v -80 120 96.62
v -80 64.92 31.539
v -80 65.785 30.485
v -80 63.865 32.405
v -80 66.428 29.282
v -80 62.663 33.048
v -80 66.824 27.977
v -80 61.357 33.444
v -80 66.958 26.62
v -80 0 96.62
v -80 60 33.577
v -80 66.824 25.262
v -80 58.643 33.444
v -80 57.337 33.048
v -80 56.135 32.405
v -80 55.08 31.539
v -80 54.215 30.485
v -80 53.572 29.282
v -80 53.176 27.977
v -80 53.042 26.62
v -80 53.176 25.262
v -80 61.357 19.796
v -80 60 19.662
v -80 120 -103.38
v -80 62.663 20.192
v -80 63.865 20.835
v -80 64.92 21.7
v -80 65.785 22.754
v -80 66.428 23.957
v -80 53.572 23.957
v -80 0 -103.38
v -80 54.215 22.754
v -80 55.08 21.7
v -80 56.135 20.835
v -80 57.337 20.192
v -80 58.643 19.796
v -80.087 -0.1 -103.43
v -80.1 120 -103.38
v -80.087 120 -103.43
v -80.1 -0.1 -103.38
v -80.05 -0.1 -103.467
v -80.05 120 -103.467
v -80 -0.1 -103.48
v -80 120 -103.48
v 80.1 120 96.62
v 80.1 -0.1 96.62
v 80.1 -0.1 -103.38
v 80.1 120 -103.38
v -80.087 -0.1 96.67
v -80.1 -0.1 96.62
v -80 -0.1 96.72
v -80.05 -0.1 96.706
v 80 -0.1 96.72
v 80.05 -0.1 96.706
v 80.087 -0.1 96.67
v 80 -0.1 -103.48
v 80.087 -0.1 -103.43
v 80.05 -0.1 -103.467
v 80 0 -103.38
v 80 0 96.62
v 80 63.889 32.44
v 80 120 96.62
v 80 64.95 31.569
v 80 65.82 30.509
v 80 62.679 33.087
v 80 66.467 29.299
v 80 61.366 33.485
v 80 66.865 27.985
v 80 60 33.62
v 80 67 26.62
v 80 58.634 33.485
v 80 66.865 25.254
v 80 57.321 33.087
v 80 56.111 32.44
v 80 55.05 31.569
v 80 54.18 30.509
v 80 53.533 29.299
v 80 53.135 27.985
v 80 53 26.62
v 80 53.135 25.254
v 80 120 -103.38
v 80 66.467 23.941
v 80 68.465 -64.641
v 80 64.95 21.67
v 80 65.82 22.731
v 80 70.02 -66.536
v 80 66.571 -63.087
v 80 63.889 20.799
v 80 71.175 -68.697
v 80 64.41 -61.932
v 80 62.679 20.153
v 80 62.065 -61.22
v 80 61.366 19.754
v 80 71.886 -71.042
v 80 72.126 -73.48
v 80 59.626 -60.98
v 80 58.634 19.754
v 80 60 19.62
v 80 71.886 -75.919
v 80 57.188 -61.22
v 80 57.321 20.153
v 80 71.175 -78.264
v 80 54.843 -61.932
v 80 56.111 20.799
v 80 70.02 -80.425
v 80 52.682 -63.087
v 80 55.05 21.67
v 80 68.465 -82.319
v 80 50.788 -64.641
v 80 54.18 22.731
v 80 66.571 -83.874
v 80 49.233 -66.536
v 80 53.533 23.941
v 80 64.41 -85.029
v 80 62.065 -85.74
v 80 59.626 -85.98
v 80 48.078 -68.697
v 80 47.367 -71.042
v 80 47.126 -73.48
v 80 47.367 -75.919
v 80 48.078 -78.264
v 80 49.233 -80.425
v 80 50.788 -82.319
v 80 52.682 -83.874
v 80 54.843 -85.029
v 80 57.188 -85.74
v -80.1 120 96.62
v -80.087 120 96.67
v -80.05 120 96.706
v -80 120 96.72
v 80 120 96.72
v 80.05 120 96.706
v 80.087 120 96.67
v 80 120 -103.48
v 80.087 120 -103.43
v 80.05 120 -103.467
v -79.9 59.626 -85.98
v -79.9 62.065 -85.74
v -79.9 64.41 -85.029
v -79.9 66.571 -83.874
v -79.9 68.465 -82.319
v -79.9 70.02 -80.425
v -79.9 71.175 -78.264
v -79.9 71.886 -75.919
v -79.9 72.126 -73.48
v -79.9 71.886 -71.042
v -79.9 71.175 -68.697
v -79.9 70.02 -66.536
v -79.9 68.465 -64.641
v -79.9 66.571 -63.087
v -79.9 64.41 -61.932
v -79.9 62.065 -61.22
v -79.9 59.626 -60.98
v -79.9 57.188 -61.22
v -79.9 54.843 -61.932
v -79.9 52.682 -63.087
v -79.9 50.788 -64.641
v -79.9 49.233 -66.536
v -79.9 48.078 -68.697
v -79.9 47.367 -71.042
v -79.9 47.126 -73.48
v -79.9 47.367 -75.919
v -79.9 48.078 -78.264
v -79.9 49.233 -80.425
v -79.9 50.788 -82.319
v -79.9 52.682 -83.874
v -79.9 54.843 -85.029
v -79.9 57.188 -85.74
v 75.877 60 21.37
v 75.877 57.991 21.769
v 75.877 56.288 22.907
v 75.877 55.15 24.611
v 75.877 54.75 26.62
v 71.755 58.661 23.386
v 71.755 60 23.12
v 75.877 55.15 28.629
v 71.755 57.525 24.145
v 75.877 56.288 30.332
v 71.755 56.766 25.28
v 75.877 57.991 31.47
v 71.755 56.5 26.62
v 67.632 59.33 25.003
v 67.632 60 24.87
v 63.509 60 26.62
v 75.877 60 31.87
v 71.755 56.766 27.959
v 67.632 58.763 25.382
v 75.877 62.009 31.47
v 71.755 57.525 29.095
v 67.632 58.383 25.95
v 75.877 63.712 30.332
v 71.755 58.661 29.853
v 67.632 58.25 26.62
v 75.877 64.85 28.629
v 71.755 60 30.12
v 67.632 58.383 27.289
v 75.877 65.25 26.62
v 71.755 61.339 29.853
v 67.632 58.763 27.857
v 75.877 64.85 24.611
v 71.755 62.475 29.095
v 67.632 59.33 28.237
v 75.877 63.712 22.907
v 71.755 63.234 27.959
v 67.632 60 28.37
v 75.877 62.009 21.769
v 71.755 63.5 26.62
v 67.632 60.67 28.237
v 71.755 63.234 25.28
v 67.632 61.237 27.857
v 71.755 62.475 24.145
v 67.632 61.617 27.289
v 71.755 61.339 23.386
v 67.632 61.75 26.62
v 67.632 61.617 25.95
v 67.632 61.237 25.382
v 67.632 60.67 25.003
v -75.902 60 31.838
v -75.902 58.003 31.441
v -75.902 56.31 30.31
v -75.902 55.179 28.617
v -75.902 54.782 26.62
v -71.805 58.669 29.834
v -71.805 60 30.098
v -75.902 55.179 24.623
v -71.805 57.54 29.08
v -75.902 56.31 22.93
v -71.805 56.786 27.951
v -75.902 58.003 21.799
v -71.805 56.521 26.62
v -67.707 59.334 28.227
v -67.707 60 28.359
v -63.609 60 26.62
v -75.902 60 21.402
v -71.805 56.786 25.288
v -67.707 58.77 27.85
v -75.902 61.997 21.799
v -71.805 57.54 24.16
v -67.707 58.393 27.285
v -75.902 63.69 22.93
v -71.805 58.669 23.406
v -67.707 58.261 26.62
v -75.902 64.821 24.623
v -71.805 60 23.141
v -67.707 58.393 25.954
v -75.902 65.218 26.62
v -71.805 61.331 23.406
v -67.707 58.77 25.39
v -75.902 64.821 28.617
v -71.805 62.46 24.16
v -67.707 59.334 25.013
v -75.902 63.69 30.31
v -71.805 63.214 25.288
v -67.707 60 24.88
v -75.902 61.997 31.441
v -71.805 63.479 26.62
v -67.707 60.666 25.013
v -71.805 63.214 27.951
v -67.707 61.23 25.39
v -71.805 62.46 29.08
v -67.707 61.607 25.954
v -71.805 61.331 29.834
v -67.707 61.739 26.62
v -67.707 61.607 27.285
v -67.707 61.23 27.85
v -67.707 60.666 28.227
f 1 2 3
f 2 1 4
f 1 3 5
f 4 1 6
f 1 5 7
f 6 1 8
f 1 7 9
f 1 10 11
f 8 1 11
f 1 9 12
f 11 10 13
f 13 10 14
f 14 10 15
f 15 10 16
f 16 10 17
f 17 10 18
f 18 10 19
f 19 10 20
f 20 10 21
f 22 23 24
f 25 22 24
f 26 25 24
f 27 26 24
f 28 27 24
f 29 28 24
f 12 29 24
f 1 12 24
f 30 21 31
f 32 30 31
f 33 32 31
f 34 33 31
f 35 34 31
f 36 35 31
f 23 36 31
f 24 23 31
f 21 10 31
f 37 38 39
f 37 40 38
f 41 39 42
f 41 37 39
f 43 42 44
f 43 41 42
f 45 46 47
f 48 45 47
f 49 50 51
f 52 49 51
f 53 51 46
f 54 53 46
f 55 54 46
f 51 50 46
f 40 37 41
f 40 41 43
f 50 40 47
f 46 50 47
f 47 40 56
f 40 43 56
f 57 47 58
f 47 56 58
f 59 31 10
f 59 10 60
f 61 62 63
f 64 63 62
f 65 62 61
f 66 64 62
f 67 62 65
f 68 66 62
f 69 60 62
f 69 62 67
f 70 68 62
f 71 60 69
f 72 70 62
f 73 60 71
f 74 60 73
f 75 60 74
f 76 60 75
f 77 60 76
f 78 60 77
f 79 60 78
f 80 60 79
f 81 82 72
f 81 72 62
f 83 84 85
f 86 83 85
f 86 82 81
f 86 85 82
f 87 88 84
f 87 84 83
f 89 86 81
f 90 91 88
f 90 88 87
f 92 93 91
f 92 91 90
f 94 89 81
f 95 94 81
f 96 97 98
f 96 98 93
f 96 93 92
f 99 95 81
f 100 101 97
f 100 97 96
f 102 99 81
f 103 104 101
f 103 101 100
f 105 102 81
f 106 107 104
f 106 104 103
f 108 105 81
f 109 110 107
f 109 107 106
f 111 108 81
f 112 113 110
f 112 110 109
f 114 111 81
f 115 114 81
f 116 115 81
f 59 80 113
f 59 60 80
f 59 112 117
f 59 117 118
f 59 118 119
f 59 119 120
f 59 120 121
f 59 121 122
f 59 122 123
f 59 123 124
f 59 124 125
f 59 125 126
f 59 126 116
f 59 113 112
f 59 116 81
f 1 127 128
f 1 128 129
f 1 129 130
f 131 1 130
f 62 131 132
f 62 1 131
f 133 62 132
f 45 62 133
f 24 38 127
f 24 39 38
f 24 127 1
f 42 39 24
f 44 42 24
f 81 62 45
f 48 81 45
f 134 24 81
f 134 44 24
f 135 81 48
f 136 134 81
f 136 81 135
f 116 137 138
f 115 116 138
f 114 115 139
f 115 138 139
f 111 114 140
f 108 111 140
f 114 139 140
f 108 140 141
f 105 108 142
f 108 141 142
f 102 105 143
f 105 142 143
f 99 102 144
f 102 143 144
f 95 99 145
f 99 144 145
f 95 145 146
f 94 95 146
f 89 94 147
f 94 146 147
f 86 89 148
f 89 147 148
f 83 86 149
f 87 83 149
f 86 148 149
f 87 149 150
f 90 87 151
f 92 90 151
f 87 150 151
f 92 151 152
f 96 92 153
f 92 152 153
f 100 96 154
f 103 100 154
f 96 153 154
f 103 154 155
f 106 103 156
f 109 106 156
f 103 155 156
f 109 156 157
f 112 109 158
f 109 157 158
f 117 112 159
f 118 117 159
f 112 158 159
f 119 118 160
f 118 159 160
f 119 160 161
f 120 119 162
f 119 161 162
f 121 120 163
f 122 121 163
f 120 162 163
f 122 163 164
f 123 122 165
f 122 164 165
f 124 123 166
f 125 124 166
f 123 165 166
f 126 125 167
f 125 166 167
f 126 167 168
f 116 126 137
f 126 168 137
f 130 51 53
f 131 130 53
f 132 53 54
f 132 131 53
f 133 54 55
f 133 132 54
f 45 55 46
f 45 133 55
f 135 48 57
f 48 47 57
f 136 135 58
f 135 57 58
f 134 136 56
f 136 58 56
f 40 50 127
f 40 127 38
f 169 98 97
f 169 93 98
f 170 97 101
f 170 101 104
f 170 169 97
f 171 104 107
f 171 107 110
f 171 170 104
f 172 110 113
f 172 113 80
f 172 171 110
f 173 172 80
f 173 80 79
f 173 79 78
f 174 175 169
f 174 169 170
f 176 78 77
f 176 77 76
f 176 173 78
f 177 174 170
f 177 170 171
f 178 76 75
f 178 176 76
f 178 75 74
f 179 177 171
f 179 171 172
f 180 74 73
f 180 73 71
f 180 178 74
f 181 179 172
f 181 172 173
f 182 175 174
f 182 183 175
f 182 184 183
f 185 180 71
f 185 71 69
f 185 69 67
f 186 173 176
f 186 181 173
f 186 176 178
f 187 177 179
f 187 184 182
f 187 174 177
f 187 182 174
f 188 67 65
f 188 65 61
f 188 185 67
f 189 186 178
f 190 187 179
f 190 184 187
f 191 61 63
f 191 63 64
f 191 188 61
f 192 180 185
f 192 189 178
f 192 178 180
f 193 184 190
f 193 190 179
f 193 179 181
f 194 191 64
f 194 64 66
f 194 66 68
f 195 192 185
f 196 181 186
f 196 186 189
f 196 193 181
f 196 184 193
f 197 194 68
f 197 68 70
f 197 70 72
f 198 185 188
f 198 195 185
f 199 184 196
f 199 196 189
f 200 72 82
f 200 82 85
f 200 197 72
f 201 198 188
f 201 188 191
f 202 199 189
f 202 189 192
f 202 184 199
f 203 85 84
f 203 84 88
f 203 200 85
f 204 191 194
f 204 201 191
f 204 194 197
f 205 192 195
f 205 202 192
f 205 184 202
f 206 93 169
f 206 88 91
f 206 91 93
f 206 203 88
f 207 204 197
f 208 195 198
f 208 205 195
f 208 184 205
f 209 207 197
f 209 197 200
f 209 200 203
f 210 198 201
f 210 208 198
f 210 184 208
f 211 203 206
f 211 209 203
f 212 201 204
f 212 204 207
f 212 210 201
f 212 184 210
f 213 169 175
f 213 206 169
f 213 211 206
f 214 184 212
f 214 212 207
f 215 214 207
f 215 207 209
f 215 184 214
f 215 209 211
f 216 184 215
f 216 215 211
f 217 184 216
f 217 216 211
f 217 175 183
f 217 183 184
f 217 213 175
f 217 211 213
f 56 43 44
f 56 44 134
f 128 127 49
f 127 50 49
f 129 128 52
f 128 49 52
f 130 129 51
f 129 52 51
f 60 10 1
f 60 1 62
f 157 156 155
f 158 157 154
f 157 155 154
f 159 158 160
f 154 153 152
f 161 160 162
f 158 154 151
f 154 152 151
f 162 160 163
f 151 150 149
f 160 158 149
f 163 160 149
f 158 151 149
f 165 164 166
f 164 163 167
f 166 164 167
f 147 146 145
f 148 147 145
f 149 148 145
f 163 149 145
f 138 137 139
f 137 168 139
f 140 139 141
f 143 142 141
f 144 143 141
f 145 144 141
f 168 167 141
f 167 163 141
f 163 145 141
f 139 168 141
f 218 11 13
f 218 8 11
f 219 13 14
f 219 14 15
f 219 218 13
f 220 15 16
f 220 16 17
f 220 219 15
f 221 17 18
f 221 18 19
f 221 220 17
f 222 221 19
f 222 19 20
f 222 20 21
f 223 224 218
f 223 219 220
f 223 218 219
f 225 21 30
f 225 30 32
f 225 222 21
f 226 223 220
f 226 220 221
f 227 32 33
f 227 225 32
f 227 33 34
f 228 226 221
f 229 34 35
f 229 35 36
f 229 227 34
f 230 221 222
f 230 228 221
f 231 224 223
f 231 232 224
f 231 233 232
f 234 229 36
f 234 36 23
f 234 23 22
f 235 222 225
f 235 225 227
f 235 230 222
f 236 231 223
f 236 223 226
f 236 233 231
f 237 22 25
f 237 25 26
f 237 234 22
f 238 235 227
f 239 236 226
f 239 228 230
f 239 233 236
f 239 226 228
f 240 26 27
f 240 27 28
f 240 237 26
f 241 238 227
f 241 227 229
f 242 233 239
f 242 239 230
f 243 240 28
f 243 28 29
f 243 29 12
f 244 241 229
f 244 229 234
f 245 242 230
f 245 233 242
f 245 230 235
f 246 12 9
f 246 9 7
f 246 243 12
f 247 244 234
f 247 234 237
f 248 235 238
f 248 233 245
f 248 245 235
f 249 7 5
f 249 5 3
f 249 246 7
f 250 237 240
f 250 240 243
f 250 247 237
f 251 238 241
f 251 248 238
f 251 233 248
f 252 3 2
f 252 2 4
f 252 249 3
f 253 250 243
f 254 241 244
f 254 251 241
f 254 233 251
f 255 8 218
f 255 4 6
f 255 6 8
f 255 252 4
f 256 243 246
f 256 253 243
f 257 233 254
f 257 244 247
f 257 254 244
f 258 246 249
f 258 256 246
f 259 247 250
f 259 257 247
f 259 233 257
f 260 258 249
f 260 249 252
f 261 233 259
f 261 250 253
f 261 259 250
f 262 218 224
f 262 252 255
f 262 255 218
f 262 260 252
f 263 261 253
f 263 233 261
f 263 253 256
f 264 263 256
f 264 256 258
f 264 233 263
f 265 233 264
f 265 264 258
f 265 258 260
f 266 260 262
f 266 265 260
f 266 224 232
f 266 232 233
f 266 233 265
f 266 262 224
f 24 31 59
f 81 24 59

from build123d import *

# Parameters (mm, degrees)
SKETCH1_W               = 160
SKETCH1_H               = 200
BOSS_EXTRUDE1_DEPTH     = 120
SHELL1_T                = 0.1
BOSS_EXTRUDE2_START     = -160
BOSS_EXTRUDE2_OUTLINE_R = 12.5
BOSS_EXTRUDE2_DEPTH     = 159.9
FILLET3_R               = 0.1


# Read off the part's stored shape, not the designer's step: Boss-Extrude2
with BuildPart() as part:
    # Sketch1 → Boss-Extrude1 (new body)
    with BuildSketch(Plane(origin=(0, 0, 0), x_dir=(1, 0, 0), z_dir=(0, 1, 0))):
        with Locations((0, 3.38028169)):
            Rectangle(SKETCH1_W, SKETCH1_H)
    extrude(amount=BOSS_EXTRUDE1_DEPTH)

    # Shell1
    shell1_openings = [part.faces().sort_by_distance(p)[0] for p in [
        (0, 120, -3.38028169),
    ]]
    offset(amount=SHELL1_T, openings=shell1_openings, kind=Kind.INTERSECTION)

    # Boss-Extrude2 outline → Boss-Extrude2 (add)
    with BuildSketch(Plane(origin=(80.1, 0, 0), x_dir=(0, 0, -1), z_dir=(1, 0, 0)).offset(BOSS_EXTRUDE2_START)):
        with Locations((73.48028169, 59.62639051)):
            Circle(BOSS_EXTRUDE2_OUTLINE_R)
    extrude(amount=BOSS_EXTRUDE2_DEPTH)

    # Fillet3
    fillet3_edges = [part.edges().sort_by_distance(p)[0] for p in [
        (80.1, 59.95, -103.48028169),
        (80.1, 59.95, 96.71971831),
        (-80.1, 59.95, 96.71971831),
        (-80.1, 59.95, -103.48028169),
    ]]
    fillet(fillet3_edges, radius=FILLET3_R)

    # Boss-Extrude3 cone 1 section (through the dimple's axis) → Boss-Extrude3 (revolve)
    with BuildSketch(Plane(origin=(-80.1, 60, 26.61971831), x_dir=(0, 0, 1), z_dir=(0, 1, 0))):
        Polygon((0, 0), (7, 0), (0, 16.490966561), align=None)
    revolve(axis=Axis((-80.1, 60, 26.61971831), (1, 0, 0)))

    # Boss-Extrude4 cone 1 section (through the dimple's axis) → Boss-Extrude4 (revolve)
    with BuildSketch(Plane(origin=(80, 60, 26.61971831), x_dir=(0, 0, -1), z_dir=(0, 1, 0))):
        Polygon((0, 0), (7, 0), (0, 16.490966561), align=None)
    revolve(axis=Axis((80, 60, 26.61971831), (-1, 0, 0)))


solid = part.part
